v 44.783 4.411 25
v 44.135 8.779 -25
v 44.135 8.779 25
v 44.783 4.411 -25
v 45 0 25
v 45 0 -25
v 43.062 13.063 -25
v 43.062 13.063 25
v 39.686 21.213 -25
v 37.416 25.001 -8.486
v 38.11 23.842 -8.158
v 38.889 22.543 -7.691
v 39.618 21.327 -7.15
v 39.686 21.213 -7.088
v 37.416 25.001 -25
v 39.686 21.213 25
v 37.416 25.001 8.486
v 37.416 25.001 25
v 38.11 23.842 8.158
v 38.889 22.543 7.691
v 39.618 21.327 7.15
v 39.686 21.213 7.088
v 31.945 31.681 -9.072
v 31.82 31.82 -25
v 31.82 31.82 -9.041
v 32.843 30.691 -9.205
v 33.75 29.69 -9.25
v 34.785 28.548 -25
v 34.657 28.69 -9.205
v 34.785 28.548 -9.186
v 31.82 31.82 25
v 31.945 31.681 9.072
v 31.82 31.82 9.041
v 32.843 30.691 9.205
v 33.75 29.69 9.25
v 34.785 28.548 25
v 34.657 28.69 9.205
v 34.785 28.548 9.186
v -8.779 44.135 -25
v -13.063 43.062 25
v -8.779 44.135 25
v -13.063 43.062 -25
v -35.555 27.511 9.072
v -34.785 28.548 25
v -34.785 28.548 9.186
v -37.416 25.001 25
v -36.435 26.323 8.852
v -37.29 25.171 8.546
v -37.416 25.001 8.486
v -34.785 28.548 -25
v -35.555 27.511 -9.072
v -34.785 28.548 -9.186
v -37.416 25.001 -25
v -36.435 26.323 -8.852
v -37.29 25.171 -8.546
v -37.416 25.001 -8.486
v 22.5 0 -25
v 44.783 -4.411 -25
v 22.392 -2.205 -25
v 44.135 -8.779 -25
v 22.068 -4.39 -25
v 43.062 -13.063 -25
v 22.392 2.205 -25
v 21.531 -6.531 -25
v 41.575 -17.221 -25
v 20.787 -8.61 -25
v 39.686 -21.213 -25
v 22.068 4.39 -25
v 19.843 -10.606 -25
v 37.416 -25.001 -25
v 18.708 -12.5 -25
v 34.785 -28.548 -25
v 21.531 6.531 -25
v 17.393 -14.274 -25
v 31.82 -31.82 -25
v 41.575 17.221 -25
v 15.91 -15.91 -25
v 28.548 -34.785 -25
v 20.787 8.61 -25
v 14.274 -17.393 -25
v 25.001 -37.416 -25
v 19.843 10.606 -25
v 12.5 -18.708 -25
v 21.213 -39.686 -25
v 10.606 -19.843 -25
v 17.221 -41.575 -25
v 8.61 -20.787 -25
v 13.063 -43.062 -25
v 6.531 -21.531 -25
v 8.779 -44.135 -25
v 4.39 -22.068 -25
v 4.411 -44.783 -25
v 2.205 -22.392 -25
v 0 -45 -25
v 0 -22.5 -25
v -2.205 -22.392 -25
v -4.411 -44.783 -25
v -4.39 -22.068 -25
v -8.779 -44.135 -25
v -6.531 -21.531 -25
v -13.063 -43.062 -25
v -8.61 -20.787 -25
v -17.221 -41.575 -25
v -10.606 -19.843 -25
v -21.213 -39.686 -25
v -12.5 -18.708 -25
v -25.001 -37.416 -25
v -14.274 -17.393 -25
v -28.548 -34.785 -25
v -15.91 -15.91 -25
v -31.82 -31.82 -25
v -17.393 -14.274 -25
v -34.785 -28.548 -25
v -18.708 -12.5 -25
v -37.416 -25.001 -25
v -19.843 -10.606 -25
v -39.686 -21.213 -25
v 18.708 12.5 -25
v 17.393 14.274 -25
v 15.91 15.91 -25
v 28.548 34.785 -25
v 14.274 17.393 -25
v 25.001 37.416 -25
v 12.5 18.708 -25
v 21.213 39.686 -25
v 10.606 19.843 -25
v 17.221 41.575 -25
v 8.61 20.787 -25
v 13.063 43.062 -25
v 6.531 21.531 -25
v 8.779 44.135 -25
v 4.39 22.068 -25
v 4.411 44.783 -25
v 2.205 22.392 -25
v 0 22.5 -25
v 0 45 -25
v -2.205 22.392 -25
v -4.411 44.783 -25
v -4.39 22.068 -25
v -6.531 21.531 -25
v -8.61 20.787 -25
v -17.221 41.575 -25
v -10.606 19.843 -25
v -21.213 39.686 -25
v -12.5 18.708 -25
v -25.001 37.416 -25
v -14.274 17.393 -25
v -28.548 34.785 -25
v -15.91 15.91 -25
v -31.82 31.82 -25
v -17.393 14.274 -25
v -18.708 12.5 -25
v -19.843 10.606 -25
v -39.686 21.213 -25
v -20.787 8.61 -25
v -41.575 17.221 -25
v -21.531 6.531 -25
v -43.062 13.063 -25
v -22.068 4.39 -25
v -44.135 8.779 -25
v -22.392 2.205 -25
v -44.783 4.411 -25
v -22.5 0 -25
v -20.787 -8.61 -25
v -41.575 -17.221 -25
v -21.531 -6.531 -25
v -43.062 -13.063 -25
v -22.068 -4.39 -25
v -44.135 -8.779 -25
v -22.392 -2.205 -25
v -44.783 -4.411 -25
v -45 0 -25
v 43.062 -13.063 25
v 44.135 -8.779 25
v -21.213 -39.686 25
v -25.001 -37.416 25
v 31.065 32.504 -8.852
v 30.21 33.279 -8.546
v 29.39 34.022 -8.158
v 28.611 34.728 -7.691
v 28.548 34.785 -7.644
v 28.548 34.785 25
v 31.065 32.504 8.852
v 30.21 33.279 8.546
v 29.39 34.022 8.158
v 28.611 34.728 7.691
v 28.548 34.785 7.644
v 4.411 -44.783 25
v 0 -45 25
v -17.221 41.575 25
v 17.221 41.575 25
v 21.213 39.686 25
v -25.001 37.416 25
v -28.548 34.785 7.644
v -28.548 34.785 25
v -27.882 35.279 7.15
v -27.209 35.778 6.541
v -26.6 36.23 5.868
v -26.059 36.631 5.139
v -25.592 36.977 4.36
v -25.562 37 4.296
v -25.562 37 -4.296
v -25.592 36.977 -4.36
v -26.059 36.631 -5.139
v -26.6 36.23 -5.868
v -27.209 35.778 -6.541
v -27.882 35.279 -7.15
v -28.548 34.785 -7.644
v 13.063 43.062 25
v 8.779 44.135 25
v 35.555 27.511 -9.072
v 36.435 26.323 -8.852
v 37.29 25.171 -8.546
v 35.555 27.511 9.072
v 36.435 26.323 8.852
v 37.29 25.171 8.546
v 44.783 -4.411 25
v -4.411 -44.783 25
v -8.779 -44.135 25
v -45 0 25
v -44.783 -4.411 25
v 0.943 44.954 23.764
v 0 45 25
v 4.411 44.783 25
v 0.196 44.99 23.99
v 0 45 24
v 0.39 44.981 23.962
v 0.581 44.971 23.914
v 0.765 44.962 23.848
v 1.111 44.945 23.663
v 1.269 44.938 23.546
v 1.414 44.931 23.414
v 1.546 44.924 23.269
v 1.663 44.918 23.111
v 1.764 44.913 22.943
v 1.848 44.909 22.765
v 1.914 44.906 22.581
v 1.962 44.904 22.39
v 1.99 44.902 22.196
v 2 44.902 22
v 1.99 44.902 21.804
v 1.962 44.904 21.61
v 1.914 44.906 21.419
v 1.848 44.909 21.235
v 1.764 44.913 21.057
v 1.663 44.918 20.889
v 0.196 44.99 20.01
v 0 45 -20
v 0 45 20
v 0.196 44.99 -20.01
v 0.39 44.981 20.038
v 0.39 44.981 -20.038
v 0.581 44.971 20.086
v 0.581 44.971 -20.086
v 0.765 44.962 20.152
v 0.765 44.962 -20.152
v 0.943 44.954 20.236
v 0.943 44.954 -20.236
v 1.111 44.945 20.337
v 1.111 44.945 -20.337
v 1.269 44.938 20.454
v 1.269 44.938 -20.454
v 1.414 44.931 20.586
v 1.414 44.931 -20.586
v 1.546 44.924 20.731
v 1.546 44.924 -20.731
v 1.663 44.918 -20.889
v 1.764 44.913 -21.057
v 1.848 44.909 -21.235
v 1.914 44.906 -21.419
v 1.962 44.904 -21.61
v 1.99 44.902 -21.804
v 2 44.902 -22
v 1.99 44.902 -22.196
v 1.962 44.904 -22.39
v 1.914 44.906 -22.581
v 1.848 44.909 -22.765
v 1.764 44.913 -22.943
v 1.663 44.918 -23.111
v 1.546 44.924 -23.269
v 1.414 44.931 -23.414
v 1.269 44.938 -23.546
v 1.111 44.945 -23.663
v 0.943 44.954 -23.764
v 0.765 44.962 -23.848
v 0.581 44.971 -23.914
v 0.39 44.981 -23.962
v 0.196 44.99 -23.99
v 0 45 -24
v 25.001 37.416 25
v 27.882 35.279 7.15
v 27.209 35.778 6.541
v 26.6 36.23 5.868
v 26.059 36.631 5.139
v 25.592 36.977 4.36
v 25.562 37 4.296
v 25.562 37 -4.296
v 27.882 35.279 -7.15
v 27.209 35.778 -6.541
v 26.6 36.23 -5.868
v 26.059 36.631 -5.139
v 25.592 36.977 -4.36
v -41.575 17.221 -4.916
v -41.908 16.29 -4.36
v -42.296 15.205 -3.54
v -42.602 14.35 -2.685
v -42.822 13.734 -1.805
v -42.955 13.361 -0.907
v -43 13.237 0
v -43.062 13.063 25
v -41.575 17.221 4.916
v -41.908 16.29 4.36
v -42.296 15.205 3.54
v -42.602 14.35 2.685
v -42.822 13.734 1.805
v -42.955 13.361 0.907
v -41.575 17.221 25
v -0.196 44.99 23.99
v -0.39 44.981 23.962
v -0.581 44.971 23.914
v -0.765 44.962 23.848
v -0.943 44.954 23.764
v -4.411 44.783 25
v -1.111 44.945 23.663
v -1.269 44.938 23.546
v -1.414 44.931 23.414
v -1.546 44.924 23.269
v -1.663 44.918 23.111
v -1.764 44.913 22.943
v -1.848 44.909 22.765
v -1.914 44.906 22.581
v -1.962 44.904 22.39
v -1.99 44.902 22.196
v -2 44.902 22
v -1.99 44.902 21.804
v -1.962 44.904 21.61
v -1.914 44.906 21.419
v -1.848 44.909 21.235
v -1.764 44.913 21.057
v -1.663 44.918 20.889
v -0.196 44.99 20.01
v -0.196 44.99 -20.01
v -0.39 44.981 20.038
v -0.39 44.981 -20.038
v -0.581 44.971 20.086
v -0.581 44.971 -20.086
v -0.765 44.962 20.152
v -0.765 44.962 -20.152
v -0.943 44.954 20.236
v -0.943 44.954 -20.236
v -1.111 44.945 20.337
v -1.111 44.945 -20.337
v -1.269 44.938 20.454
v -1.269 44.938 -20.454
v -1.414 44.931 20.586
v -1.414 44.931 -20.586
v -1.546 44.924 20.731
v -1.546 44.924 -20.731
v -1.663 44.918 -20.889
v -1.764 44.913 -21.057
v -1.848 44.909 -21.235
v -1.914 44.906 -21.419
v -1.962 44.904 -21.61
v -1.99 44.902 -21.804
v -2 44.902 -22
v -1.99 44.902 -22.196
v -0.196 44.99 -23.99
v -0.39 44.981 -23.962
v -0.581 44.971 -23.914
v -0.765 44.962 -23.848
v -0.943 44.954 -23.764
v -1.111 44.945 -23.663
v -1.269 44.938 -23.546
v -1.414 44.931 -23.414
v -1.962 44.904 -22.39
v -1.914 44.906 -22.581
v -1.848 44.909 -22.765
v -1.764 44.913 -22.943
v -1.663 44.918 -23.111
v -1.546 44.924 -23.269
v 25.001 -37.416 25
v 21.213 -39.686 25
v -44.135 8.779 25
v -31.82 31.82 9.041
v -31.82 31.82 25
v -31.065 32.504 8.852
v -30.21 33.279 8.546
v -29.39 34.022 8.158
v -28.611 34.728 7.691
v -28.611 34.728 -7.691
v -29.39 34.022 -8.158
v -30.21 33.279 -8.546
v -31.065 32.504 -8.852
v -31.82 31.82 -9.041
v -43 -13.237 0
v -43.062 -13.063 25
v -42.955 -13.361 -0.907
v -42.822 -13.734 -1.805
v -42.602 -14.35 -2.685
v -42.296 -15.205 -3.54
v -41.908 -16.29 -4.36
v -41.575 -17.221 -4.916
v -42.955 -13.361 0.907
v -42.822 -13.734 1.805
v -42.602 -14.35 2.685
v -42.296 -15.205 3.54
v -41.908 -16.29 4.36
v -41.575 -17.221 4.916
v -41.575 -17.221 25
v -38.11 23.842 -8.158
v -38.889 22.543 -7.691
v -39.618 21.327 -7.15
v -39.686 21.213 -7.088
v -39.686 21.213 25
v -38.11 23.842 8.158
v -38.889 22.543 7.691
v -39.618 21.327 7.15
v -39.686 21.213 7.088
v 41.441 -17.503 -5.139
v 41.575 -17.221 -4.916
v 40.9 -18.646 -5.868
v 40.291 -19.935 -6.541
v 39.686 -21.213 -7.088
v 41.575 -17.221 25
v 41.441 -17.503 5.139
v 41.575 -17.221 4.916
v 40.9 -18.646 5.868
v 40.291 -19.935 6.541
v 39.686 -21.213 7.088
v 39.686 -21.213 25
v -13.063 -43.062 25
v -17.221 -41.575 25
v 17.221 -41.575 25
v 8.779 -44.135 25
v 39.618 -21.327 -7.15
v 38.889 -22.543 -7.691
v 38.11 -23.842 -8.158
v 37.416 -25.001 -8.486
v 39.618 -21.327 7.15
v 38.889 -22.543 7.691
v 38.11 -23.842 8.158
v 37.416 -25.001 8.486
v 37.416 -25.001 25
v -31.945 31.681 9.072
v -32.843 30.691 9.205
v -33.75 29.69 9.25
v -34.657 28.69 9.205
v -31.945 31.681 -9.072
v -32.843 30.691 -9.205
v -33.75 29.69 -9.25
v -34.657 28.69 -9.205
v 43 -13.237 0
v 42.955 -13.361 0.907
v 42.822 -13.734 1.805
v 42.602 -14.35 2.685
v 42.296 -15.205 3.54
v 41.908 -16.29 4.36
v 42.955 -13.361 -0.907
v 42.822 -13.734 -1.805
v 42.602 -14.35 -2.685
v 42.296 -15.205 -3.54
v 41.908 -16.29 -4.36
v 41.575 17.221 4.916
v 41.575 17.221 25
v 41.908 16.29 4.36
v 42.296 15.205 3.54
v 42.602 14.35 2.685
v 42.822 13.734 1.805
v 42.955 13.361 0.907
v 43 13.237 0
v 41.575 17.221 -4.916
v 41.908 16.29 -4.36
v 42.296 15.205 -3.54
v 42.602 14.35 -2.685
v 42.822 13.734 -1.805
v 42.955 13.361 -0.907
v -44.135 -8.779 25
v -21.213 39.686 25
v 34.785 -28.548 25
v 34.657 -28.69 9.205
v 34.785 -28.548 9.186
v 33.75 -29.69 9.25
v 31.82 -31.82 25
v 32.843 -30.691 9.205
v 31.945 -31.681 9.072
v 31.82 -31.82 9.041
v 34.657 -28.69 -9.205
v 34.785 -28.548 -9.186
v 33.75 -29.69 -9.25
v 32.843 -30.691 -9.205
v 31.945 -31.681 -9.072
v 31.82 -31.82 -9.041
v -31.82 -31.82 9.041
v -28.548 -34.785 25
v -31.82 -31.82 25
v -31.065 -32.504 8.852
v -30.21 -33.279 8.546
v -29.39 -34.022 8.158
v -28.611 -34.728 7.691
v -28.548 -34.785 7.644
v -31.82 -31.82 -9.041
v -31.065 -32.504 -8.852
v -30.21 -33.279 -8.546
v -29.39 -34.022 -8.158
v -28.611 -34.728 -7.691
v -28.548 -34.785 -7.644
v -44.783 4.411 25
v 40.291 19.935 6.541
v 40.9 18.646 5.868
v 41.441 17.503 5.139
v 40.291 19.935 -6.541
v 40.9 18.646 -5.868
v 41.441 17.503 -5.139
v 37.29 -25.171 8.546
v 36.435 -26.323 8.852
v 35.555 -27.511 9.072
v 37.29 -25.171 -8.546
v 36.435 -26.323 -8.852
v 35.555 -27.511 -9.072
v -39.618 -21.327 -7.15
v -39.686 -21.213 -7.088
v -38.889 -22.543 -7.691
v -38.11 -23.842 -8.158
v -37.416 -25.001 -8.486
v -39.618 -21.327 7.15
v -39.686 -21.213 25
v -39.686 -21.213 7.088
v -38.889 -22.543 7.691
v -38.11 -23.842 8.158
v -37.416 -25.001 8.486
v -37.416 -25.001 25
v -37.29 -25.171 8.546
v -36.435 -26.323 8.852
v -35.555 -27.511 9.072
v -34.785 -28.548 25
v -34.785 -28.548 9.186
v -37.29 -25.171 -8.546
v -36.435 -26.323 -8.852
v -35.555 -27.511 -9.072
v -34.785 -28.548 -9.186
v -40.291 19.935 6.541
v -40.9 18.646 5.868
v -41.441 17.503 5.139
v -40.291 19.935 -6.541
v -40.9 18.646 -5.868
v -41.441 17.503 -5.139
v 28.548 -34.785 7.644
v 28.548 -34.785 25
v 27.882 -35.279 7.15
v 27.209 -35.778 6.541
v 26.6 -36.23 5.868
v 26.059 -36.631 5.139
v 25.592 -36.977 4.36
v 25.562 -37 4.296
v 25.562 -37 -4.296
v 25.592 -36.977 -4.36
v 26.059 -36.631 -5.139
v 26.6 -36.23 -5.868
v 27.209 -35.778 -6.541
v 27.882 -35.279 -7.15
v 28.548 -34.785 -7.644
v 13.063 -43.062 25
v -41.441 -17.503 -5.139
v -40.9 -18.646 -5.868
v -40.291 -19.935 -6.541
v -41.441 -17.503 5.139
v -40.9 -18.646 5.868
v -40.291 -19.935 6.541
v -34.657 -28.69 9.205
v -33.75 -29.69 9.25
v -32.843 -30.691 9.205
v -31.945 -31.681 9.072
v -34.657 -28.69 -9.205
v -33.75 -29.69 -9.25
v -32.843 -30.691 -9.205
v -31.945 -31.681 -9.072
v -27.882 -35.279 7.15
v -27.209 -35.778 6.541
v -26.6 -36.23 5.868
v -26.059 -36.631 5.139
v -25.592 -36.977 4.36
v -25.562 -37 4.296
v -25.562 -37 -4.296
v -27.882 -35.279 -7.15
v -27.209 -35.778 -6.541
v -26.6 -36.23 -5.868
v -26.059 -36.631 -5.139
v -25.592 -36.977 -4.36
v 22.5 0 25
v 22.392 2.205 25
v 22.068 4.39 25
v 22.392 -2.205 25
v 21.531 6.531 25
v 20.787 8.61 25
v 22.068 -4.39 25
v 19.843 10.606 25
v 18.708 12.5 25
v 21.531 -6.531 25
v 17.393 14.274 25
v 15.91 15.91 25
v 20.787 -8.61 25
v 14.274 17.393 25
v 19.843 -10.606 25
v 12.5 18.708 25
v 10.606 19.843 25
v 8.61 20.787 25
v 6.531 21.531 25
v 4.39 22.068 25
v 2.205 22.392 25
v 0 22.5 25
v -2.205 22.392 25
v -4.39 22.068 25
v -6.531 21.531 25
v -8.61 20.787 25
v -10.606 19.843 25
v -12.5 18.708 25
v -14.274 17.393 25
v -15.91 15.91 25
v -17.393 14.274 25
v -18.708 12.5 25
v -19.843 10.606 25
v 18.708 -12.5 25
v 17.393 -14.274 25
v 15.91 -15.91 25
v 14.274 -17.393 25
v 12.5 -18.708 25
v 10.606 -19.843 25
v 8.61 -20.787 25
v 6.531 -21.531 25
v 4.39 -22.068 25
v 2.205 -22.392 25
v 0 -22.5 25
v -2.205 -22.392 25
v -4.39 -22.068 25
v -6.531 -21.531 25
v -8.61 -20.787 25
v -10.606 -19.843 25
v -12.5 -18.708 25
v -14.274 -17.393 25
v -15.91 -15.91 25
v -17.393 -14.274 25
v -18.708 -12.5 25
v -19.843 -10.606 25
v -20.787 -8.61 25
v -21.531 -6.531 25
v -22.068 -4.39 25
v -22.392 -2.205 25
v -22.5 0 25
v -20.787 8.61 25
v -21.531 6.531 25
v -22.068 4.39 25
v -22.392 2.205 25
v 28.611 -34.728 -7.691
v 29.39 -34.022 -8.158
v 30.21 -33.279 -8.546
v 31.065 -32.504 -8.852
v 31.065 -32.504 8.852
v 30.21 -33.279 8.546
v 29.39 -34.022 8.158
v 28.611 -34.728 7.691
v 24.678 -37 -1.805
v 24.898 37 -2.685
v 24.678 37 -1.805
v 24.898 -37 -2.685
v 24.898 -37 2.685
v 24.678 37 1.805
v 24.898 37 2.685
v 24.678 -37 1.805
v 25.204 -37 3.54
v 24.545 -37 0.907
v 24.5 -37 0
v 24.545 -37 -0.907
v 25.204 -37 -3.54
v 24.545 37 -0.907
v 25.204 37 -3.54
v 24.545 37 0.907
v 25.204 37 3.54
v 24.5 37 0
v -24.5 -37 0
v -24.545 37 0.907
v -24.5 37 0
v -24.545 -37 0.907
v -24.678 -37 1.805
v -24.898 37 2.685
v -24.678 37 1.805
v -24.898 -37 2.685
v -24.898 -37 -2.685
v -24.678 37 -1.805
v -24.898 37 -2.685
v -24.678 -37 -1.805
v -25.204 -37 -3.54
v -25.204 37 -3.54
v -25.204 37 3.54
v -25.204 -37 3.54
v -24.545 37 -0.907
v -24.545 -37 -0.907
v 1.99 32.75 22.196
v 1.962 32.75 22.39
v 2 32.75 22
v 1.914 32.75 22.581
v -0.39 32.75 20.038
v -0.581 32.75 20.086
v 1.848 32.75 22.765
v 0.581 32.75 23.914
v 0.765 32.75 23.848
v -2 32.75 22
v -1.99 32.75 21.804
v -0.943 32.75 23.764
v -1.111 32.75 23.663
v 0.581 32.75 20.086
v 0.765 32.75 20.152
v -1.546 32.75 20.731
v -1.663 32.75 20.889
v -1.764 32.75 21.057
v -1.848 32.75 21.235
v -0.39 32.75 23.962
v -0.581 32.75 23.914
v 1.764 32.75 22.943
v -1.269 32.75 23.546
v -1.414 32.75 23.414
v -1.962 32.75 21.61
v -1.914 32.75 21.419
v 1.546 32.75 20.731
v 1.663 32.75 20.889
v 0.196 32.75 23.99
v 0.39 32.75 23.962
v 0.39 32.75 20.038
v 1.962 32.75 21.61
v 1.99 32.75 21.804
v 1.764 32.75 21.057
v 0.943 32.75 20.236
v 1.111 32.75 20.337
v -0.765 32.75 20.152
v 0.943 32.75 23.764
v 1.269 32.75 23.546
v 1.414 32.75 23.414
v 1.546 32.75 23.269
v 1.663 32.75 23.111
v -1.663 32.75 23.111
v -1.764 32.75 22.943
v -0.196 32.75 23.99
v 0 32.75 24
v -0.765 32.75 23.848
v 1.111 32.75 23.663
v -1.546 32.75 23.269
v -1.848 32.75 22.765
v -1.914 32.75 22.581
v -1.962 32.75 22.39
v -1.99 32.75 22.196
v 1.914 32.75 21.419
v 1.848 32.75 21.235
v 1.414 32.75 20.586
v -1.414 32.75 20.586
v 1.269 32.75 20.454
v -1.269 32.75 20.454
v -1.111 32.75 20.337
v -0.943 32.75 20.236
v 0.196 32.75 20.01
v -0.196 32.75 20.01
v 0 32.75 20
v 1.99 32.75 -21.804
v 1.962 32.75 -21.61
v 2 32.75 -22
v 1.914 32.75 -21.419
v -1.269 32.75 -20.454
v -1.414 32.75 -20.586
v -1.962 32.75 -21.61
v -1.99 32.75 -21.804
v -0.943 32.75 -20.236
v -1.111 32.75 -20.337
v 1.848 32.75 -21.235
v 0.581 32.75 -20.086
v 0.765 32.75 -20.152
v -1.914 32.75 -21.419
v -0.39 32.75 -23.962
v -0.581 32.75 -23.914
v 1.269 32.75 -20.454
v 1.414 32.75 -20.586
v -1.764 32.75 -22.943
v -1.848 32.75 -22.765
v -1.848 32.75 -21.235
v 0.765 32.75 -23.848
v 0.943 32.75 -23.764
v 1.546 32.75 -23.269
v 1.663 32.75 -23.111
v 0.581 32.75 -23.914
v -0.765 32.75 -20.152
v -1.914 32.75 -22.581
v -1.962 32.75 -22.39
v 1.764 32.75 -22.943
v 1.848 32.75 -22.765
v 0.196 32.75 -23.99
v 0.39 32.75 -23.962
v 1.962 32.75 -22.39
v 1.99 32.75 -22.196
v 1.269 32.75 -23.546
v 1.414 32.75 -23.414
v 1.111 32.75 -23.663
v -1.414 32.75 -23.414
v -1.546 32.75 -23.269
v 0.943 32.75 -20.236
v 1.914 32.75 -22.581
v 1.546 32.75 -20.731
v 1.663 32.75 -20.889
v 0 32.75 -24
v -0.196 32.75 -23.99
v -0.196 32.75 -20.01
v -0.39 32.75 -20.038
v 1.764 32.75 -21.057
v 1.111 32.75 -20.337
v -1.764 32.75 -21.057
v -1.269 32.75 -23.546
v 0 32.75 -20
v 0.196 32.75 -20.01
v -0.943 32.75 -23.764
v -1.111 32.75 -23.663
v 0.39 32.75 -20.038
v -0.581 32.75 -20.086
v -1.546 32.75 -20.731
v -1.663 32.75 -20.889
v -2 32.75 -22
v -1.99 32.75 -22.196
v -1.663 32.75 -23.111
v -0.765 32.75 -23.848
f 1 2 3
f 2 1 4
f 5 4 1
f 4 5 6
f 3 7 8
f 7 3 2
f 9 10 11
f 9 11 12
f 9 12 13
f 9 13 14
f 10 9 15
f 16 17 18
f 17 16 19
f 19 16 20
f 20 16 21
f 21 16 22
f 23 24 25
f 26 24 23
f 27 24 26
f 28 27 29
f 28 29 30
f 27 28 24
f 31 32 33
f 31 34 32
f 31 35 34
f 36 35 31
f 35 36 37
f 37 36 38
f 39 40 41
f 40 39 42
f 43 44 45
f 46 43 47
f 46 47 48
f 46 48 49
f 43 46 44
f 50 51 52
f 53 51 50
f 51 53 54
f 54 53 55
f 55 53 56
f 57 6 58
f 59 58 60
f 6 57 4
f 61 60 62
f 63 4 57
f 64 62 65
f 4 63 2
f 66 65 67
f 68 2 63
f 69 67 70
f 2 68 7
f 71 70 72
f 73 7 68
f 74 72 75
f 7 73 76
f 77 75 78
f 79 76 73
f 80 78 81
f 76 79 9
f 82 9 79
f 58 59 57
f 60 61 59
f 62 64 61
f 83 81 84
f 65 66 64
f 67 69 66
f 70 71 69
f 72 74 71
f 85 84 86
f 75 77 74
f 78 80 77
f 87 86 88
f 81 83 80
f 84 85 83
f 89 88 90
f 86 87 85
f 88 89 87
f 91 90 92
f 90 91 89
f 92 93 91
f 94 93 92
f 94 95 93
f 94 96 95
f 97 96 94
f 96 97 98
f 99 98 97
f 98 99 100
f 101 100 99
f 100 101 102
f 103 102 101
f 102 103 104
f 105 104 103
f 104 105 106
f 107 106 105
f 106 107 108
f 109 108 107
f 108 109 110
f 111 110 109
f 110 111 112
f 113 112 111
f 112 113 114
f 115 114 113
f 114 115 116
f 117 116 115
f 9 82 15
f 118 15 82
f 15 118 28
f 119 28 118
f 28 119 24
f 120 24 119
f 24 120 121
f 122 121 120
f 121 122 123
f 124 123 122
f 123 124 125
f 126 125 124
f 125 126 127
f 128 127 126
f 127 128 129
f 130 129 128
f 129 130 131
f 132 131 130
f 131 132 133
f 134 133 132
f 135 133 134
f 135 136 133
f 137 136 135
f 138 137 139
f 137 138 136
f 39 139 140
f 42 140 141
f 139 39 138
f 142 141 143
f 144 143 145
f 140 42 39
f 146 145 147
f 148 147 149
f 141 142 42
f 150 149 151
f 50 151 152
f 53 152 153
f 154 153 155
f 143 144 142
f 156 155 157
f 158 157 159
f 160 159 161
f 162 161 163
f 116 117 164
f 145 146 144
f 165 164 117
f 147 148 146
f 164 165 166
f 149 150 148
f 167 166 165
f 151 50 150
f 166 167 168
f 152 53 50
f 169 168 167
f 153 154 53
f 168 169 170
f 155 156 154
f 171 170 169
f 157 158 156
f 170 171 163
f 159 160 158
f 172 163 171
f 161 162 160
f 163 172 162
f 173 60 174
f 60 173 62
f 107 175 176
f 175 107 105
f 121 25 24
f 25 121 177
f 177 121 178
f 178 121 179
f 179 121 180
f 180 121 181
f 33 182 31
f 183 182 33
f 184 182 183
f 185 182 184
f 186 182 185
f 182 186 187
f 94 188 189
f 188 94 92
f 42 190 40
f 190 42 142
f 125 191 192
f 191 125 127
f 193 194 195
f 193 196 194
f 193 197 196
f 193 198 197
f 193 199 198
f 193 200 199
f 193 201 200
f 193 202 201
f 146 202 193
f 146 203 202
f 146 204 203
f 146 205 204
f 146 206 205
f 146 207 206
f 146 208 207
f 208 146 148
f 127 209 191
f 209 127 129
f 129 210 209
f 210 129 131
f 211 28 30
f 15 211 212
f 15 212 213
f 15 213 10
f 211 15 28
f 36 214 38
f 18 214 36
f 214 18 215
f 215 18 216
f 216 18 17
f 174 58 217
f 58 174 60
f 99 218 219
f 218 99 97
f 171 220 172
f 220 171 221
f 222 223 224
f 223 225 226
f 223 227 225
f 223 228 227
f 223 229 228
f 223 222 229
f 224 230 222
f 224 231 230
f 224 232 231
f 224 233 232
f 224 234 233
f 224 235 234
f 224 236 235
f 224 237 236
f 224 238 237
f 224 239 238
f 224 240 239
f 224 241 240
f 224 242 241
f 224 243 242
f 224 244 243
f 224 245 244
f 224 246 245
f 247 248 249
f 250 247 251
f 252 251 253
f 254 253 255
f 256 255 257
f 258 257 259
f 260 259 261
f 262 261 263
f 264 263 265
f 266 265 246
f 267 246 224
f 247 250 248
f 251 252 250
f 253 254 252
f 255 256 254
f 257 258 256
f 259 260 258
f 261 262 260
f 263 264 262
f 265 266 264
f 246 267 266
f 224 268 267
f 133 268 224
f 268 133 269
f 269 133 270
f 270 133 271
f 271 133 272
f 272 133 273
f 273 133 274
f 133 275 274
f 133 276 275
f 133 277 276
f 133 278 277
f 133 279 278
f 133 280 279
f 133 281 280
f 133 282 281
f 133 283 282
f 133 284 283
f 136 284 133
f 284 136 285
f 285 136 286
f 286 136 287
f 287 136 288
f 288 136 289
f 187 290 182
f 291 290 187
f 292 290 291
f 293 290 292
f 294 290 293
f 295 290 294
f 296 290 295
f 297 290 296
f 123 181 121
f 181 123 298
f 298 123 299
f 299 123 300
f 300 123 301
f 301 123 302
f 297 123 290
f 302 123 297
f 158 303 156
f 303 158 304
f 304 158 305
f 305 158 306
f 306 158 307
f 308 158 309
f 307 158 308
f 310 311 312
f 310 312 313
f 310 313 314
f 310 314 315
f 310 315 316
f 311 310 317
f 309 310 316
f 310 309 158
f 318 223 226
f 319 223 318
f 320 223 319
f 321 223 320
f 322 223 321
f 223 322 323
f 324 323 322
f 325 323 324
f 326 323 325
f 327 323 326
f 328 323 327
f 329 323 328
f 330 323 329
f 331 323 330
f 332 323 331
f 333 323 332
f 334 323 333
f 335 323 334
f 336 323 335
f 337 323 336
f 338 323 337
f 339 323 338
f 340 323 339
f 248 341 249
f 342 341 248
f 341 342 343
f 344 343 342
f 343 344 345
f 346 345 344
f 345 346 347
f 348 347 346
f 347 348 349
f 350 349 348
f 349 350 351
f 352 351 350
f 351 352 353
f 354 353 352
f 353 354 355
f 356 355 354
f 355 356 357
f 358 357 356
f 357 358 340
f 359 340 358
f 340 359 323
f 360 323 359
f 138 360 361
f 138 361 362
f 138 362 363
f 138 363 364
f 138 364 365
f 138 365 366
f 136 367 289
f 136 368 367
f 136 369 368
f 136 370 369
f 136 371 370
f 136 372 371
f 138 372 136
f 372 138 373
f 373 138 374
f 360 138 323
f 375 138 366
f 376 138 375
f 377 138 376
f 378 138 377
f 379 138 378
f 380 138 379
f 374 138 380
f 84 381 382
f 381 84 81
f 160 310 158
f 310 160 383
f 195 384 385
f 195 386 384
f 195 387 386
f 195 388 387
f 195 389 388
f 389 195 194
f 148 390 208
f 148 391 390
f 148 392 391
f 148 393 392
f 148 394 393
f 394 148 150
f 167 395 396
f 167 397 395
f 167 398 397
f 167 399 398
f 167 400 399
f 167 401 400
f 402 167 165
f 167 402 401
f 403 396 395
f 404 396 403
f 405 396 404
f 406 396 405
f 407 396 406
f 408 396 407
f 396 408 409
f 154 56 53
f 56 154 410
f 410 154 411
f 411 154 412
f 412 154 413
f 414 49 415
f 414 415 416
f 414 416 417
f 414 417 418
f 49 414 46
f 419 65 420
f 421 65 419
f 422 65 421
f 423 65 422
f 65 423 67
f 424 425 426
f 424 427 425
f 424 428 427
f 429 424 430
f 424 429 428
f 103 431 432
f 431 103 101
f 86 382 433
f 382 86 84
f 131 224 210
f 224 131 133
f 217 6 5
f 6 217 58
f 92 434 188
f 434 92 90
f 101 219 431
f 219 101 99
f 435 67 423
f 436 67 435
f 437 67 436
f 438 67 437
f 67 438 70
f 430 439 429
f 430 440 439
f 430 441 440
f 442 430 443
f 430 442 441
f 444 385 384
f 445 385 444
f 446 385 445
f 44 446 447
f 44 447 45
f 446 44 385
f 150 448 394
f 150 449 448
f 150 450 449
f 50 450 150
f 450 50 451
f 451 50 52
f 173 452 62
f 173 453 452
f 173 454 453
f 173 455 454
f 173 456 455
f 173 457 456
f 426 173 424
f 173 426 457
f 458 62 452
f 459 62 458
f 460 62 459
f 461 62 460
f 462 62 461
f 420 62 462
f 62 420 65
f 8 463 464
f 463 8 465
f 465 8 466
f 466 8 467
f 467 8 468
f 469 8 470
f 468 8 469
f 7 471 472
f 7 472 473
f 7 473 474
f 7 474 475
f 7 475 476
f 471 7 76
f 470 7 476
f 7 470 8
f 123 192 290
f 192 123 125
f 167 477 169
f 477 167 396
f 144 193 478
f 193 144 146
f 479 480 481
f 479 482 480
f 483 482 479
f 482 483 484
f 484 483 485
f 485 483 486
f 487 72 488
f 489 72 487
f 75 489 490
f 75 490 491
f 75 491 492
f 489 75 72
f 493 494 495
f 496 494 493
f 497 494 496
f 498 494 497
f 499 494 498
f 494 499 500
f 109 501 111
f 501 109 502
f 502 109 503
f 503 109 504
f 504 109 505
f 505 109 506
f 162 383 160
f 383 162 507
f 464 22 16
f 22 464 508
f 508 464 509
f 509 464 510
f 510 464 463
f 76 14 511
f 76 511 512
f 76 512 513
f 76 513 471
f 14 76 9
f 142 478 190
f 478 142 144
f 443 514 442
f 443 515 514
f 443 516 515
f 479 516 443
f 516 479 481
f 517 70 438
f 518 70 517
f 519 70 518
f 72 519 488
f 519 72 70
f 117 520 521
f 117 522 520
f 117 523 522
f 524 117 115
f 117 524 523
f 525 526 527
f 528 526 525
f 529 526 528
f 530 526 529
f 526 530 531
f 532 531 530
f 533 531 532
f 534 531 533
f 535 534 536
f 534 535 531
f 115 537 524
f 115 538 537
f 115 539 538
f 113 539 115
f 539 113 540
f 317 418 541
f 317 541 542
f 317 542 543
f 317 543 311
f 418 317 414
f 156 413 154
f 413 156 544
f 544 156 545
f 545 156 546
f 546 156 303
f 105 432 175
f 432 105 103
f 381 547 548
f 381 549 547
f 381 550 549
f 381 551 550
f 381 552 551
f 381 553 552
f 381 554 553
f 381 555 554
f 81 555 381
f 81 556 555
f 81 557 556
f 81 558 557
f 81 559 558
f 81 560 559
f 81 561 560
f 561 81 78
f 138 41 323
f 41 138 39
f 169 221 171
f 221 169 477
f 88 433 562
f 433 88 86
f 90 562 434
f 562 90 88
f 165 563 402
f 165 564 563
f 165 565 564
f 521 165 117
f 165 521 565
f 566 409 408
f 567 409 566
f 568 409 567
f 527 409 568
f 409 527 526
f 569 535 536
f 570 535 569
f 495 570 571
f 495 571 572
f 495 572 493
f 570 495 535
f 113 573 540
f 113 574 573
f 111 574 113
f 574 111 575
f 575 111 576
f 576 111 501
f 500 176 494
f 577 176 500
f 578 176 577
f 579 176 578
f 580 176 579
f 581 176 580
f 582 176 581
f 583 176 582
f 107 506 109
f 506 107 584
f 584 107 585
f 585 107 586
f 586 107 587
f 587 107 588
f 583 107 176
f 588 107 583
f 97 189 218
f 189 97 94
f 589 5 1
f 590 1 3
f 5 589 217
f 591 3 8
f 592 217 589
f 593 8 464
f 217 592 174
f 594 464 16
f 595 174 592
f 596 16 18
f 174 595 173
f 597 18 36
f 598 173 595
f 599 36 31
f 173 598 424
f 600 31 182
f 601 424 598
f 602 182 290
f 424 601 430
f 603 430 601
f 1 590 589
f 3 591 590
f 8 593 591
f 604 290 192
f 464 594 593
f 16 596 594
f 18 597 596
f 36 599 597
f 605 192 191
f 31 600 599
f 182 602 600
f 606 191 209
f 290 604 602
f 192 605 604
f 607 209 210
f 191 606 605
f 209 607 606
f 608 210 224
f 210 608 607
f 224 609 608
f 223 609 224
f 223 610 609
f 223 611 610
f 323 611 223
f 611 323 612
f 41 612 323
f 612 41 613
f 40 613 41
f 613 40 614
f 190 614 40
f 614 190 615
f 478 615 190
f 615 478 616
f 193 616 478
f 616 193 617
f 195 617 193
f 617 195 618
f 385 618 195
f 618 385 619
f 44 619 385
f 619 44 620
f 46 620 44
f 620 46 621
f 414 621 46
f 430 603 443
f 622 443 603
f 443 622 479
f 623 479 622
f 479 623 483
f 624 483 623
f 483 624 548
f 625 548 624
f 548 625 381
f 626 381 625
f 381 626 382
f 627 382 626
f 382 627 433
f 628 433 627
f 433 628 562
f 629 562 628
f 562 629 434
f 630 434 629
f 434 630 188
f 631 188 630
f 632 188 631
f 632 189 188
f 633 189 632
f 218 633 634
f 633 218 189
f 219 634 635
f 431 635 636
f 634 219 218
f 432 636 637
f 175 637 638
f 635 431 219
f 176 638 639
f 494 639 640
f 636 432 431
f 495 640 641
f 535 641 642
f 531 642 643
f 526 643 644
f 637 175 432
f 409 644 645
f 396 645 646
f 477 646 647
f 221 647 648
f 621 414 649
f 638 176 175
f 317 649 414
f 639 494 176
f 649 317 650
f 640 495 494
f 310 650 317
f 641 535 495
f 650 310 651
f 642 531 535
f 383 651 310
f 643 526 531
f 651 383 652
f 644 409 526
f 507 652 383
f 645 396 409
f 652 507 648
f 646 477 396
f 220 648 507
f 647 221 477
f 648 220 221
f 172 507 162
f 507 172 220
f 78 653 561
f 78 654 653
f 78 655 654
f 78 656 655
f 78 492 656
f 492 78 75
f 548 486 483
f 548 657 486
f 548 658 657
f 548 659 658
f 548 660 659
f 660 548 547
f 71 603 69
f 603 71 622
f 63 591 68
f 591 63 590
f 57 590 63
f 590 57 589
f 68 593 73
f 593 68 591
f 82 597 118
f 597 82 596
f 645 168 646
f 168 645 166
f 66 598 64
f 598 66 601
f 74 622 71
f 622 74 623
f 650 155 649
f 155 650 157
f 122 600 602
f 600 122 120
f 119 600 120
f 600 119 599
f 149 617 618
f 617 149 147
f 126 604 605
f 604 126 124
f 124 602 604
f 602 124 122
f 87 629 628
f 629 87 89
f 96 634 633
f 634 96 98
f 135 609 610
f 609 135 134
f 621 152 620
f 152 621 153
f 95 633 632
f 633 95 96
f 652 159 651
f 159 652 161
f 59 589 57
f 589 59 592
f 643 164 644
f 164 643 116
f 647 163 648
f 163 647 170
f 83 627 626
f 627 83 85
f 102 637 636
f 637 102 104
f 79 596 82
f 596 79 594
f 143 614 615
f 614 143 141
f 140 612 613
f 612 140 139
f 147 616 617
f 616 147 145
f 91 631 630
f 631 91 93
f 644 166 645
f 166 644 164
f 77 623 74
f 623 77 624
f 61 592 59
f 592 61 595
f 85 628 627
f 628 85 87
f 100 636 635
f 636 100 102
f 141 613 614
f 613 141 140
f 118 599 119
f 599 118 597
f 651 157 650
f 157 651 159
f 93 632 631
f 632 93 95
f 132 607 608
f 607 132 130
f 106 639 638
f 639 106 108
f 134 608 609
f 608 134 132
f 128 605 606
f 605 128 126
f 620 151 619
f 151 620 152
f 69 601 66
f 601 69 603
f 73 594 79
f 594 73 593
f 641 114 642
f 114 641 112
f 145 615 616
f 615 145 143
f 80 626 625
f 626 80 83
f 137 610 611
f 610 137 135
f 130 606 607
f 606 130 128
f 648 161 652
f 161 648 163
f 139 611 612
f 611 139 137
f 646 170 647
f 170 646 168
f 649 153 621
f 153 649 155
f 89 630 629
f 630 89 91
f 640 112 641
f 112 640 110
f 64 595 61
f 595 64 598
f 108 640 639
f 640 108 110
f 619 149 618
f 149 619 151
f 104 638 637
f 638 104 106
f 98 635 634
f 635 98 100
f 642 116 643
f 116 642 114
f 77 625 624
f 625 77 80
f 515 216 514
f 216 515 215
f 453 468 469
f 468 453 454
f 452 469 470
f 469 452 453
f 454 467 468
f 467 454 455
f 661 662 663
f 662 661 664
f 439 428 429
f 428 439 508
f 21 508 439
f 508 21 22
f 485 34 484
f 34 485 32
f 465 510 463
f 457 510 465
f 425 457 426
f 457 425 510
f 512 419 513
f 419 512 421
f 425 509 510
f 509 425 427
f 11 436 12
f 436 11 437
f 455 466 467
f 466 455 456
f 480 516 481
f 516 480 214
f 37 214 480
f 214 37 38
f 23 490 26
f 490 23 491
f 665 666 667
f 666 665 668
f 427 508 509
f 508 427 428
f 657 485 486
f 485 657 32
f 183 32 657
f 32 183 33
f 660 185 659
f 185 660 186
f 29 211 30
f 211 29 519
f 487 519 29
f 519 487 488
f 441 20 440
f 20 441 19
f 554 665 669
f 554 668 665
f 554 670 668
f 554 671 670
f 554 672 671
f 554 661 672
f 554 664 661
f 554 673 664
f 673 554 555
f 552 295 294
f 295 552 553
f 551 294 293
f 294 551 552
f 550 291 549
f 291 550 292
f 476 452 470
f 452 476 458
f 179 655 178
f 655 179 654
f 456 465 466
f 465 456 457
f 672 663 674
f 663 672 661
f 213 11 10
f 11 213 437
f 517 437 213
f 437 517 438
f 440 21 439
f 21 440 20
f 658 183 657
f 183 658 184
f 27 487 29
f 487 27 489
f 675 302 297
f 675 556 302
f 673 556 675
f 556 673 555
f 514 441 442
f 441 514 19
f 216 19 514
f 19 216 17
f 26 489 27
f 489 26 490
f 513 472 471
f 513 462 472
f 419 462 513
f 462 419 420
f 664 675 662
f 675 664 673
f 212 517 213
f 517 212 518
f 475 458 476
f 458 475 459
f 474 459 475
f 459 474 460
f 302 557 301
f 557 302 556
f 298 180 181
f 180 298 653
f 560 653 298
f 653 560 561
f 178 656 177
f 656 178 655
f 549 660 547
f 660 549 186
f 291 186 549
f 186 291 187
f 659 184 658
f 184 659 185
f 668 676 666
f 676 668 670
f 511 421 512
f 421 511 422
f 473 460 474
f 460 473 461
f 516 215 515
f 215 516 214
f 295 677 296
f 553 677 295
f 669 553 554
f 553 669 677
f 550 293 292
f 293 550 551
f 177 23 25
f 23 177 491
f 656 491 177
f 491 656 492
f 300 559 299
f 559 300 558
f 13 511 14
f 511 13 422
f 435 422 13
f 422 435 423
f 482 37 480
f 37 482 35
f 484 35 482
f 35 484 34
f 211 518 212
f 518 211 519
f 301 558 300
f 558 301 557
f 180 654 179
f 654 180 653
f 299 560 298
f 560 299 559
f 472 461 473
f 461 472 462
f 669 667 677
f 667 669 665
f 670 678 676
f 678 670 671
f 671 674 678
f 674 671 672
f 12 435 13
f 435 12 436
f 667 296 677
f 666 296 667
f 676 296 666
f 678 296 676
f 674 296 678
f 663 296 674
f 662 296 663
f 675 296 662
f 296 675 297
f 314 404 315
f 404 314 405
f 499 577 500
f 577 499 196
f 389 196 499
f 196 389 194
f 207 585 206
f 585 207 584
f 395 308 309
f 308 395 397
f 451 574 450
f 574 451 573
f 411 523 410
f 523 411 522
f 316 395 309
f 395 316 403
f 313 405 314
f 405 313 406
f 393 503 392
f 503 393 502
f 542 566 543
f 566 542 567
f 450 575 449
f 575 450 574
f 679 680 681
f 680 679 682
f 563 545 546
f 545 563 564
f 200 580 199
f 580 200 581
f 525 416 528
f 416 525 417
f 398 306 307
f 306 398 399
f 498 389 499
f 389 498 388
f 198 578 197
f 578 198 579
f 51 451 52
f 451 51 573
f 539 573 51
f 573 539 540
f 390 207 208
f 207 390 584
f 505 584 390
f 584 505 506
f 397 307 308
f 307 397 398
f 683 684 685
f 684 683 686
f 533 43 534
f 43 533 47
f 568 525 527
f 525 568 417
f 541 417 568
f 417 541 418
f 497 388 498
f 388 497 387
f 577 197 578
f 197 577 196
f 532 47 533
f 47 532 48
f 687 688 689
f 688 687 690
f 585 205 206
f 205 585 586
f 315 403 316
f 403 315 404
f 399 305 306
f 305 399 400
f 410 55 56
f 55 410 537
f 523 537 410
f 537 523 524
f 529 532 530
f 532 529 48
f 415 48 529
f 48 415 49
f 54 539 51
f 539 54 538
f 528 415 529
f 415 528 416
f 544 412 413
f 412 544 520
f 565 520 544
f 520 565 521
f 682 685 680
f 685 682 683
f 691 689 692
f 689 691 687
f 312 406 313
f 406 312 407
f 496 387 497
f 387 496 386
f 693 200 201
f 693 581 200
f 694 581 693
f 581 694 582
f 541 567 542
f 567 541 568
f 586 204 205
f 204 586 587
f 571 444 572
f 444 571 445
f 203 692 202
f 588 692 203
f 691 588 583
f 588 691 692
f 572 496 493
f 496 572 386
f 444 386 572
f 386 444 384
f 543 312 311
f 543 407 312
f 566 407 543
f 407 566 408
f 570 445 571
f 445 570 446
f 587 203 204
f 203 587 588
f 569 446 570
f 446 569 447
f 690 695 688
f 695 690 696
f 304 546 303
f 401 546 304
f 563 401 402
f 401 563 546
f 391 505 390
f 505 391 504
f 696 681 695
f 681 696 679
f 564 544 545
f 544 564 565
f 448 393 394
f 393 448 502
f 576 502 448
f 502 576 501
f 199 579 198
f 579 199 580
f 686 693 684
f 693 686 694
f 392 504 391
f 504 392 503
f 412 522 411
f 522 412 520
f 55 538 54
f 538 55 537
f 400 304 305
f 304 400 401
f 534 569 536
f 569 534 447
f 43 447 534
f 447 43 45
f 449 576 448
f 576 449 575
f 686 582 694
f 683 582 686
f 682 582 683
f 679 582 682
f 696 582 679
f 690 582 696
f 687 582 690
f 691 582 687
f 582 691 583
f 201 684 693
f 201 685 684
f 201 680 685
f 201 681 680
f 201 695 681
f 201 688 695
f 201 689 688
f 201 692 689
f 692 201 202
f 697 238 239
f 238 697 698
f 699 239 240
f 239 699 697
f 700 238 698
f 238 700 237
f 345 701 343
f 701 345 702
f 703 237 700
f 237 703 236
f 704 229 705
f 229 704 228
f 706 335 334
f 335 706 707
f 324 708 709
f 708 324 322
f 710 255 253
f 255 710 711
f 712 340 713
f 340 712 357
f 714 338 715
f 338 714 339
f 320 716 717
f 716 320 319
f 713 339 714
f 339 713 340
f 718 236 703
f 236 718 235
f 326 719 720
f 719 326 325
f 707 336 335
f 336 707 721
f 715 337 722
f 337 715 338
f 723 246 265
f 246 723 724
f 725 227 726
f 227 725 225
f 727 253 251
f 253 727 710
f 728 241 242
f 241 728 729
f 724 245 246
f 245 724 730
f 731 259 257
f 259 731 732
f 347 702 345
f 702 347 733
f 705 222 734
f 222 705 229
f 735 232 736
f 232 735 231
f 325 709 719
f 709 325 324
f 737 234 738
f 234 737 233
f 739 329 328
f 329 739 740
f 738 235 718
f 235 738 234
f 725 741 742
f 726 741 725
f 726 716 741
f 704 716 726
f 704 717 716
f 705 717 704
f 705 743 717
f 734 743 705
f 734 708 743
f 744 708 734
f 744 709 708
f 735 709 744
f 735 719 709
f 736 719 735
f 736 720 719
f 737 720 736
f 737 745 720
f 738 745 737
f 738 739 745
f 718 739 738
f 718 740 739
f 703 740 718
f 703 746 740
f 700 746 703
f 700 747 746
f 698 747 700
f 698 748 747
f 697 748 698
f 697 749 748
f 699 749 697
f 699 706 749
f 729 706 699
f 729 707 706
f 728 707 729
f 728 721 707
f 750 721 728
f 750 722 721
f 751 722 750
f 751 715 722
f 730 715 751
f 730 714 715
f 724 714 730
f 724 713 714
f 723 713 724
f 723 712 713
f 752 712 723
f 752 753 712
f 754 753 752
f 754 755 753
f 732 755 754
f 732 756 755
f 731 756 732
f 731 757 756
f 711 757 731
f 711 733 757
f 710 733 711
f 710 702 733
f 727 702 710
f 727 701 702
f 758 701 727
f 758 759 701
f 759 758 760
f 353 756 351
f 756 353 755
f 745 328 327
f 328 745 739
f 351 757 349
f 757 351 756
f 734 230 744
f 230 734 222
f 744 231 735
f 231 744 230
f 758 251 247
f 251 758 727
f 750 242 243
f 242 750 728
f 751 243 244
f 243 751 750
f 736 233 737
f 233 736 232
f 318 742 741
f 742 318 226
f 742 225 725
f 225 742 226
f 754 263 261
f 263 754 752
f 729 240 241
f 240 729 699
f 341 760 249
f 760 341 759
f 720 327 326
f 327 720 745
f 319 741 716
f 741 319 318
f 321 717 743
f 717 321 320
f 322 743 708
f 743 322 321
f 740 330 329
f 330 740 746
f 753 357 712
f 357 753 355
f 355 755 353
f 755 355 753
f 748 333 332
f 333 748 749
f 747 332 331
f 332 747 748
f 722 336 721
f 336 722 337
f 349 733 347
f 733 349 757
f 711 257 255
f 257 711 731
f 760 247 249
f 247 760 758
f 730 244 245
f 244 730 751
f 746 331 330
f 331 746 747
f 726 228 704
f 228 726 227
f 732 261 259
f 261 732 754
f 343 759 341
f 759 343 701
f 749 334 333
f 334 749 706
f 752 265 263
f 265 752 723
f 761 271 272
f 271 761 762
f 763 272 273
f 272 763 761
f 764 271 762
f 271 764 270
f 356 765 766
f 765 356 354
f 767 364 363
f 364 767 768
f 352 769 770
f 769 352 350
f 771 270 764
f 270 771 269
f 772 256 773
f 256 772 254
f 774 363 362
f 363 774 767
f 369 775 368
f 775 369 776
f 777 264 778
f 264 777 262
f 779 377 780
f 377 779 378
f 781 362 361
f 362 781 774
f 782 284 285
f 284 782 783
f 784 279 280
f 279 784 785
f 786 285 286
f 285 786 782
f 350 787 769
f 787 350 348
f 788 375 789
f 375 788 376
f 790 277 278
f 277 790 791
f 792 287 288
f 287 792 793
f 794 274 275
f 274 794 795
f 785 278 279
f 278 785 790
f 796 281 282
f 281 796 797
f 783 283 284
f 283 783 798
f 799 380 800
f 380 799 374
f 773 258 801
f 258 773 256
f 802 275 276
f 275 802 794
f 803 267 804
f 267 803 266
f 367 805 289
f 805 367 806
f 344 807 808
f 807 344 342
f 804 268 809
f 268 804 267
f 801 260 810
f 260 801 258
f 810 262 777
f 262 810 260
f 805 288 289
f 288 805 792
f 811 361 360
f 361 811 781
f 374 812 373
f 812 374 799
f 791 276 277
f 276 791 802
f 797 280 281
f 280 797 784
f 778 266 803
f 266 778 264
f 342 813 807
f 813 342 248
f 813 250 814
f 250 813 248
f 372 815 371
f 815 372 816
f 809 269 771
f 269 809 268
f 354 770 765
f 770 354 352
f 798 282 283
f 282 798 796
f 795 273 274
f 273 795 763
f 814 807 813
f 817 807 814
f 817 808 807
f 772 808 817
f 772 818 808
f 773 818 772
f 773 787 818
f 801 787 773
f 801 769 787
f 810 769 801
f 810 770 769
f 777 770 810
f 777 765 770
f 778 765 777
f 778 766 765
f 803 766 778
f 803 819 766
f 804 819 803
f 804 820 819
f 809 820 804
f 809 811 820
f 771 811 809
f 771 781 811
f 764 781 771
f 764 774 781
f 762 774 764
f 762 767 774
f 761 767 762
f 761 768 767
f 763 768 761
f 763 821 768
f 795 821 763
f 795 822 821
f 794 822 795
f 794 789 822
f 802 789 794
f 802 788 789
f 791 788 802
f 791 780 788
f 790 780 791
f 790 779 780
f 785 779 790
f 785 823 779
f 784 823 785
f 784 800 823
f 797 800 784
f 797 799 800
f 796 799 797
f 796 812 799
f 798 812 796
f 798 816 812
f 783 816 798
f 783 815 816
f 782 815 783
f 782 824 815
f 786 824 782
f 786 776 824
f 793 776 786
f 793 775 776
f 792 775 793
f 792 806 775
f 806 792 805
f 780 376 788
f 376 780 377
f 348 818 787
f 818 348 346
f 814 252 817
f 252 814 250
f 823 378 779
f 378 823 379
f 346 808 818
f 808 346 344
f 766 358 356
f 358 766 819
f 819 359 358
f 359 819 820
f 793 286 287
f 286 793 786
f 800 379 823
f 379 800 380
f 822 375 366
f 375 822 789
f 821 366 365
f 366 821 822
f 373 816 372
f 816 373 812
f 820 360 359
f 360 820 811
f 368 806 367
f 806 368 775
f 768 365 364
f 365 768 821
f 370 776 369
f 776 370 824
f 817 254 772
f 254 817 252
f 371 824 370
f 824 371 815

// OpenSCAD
// COBRA Vertebra - L5 V23
// Height: 50.0mm, OD: 90.0mm

$fn = 64;

difference() {
    // Outer cylinder
    cylinder(h=50.0, d=90.0, center=true);
    
    // Inner channel
    cylinder(h=52.0, d=45.0, center=true);

    // Battery cavity 1
    rotate([0, 0, 0])
    translate([33.75, 0, 0])
    rotate([90, 0, 0])
    cylinder(h=74.0, d=18.5, center=true);

    // Battery cavity 2
    rotate([0, 0, 180])
    translate([33.75, 0, 0])
    rotate([90, 0, 0])
    cylinder(h=74.0, d=18.5, center=true);

    // Pivot holes
    translate([0, 45.0, 22.0])
    rotate([90, 0, 0])
    cylinder(h=24.5, d=4, center=true);
    
    translate([0, 45.0, -22.0])
    rotate([90, 0, 0])
    cylinder(h=24.5, d=4, center=true);
}
